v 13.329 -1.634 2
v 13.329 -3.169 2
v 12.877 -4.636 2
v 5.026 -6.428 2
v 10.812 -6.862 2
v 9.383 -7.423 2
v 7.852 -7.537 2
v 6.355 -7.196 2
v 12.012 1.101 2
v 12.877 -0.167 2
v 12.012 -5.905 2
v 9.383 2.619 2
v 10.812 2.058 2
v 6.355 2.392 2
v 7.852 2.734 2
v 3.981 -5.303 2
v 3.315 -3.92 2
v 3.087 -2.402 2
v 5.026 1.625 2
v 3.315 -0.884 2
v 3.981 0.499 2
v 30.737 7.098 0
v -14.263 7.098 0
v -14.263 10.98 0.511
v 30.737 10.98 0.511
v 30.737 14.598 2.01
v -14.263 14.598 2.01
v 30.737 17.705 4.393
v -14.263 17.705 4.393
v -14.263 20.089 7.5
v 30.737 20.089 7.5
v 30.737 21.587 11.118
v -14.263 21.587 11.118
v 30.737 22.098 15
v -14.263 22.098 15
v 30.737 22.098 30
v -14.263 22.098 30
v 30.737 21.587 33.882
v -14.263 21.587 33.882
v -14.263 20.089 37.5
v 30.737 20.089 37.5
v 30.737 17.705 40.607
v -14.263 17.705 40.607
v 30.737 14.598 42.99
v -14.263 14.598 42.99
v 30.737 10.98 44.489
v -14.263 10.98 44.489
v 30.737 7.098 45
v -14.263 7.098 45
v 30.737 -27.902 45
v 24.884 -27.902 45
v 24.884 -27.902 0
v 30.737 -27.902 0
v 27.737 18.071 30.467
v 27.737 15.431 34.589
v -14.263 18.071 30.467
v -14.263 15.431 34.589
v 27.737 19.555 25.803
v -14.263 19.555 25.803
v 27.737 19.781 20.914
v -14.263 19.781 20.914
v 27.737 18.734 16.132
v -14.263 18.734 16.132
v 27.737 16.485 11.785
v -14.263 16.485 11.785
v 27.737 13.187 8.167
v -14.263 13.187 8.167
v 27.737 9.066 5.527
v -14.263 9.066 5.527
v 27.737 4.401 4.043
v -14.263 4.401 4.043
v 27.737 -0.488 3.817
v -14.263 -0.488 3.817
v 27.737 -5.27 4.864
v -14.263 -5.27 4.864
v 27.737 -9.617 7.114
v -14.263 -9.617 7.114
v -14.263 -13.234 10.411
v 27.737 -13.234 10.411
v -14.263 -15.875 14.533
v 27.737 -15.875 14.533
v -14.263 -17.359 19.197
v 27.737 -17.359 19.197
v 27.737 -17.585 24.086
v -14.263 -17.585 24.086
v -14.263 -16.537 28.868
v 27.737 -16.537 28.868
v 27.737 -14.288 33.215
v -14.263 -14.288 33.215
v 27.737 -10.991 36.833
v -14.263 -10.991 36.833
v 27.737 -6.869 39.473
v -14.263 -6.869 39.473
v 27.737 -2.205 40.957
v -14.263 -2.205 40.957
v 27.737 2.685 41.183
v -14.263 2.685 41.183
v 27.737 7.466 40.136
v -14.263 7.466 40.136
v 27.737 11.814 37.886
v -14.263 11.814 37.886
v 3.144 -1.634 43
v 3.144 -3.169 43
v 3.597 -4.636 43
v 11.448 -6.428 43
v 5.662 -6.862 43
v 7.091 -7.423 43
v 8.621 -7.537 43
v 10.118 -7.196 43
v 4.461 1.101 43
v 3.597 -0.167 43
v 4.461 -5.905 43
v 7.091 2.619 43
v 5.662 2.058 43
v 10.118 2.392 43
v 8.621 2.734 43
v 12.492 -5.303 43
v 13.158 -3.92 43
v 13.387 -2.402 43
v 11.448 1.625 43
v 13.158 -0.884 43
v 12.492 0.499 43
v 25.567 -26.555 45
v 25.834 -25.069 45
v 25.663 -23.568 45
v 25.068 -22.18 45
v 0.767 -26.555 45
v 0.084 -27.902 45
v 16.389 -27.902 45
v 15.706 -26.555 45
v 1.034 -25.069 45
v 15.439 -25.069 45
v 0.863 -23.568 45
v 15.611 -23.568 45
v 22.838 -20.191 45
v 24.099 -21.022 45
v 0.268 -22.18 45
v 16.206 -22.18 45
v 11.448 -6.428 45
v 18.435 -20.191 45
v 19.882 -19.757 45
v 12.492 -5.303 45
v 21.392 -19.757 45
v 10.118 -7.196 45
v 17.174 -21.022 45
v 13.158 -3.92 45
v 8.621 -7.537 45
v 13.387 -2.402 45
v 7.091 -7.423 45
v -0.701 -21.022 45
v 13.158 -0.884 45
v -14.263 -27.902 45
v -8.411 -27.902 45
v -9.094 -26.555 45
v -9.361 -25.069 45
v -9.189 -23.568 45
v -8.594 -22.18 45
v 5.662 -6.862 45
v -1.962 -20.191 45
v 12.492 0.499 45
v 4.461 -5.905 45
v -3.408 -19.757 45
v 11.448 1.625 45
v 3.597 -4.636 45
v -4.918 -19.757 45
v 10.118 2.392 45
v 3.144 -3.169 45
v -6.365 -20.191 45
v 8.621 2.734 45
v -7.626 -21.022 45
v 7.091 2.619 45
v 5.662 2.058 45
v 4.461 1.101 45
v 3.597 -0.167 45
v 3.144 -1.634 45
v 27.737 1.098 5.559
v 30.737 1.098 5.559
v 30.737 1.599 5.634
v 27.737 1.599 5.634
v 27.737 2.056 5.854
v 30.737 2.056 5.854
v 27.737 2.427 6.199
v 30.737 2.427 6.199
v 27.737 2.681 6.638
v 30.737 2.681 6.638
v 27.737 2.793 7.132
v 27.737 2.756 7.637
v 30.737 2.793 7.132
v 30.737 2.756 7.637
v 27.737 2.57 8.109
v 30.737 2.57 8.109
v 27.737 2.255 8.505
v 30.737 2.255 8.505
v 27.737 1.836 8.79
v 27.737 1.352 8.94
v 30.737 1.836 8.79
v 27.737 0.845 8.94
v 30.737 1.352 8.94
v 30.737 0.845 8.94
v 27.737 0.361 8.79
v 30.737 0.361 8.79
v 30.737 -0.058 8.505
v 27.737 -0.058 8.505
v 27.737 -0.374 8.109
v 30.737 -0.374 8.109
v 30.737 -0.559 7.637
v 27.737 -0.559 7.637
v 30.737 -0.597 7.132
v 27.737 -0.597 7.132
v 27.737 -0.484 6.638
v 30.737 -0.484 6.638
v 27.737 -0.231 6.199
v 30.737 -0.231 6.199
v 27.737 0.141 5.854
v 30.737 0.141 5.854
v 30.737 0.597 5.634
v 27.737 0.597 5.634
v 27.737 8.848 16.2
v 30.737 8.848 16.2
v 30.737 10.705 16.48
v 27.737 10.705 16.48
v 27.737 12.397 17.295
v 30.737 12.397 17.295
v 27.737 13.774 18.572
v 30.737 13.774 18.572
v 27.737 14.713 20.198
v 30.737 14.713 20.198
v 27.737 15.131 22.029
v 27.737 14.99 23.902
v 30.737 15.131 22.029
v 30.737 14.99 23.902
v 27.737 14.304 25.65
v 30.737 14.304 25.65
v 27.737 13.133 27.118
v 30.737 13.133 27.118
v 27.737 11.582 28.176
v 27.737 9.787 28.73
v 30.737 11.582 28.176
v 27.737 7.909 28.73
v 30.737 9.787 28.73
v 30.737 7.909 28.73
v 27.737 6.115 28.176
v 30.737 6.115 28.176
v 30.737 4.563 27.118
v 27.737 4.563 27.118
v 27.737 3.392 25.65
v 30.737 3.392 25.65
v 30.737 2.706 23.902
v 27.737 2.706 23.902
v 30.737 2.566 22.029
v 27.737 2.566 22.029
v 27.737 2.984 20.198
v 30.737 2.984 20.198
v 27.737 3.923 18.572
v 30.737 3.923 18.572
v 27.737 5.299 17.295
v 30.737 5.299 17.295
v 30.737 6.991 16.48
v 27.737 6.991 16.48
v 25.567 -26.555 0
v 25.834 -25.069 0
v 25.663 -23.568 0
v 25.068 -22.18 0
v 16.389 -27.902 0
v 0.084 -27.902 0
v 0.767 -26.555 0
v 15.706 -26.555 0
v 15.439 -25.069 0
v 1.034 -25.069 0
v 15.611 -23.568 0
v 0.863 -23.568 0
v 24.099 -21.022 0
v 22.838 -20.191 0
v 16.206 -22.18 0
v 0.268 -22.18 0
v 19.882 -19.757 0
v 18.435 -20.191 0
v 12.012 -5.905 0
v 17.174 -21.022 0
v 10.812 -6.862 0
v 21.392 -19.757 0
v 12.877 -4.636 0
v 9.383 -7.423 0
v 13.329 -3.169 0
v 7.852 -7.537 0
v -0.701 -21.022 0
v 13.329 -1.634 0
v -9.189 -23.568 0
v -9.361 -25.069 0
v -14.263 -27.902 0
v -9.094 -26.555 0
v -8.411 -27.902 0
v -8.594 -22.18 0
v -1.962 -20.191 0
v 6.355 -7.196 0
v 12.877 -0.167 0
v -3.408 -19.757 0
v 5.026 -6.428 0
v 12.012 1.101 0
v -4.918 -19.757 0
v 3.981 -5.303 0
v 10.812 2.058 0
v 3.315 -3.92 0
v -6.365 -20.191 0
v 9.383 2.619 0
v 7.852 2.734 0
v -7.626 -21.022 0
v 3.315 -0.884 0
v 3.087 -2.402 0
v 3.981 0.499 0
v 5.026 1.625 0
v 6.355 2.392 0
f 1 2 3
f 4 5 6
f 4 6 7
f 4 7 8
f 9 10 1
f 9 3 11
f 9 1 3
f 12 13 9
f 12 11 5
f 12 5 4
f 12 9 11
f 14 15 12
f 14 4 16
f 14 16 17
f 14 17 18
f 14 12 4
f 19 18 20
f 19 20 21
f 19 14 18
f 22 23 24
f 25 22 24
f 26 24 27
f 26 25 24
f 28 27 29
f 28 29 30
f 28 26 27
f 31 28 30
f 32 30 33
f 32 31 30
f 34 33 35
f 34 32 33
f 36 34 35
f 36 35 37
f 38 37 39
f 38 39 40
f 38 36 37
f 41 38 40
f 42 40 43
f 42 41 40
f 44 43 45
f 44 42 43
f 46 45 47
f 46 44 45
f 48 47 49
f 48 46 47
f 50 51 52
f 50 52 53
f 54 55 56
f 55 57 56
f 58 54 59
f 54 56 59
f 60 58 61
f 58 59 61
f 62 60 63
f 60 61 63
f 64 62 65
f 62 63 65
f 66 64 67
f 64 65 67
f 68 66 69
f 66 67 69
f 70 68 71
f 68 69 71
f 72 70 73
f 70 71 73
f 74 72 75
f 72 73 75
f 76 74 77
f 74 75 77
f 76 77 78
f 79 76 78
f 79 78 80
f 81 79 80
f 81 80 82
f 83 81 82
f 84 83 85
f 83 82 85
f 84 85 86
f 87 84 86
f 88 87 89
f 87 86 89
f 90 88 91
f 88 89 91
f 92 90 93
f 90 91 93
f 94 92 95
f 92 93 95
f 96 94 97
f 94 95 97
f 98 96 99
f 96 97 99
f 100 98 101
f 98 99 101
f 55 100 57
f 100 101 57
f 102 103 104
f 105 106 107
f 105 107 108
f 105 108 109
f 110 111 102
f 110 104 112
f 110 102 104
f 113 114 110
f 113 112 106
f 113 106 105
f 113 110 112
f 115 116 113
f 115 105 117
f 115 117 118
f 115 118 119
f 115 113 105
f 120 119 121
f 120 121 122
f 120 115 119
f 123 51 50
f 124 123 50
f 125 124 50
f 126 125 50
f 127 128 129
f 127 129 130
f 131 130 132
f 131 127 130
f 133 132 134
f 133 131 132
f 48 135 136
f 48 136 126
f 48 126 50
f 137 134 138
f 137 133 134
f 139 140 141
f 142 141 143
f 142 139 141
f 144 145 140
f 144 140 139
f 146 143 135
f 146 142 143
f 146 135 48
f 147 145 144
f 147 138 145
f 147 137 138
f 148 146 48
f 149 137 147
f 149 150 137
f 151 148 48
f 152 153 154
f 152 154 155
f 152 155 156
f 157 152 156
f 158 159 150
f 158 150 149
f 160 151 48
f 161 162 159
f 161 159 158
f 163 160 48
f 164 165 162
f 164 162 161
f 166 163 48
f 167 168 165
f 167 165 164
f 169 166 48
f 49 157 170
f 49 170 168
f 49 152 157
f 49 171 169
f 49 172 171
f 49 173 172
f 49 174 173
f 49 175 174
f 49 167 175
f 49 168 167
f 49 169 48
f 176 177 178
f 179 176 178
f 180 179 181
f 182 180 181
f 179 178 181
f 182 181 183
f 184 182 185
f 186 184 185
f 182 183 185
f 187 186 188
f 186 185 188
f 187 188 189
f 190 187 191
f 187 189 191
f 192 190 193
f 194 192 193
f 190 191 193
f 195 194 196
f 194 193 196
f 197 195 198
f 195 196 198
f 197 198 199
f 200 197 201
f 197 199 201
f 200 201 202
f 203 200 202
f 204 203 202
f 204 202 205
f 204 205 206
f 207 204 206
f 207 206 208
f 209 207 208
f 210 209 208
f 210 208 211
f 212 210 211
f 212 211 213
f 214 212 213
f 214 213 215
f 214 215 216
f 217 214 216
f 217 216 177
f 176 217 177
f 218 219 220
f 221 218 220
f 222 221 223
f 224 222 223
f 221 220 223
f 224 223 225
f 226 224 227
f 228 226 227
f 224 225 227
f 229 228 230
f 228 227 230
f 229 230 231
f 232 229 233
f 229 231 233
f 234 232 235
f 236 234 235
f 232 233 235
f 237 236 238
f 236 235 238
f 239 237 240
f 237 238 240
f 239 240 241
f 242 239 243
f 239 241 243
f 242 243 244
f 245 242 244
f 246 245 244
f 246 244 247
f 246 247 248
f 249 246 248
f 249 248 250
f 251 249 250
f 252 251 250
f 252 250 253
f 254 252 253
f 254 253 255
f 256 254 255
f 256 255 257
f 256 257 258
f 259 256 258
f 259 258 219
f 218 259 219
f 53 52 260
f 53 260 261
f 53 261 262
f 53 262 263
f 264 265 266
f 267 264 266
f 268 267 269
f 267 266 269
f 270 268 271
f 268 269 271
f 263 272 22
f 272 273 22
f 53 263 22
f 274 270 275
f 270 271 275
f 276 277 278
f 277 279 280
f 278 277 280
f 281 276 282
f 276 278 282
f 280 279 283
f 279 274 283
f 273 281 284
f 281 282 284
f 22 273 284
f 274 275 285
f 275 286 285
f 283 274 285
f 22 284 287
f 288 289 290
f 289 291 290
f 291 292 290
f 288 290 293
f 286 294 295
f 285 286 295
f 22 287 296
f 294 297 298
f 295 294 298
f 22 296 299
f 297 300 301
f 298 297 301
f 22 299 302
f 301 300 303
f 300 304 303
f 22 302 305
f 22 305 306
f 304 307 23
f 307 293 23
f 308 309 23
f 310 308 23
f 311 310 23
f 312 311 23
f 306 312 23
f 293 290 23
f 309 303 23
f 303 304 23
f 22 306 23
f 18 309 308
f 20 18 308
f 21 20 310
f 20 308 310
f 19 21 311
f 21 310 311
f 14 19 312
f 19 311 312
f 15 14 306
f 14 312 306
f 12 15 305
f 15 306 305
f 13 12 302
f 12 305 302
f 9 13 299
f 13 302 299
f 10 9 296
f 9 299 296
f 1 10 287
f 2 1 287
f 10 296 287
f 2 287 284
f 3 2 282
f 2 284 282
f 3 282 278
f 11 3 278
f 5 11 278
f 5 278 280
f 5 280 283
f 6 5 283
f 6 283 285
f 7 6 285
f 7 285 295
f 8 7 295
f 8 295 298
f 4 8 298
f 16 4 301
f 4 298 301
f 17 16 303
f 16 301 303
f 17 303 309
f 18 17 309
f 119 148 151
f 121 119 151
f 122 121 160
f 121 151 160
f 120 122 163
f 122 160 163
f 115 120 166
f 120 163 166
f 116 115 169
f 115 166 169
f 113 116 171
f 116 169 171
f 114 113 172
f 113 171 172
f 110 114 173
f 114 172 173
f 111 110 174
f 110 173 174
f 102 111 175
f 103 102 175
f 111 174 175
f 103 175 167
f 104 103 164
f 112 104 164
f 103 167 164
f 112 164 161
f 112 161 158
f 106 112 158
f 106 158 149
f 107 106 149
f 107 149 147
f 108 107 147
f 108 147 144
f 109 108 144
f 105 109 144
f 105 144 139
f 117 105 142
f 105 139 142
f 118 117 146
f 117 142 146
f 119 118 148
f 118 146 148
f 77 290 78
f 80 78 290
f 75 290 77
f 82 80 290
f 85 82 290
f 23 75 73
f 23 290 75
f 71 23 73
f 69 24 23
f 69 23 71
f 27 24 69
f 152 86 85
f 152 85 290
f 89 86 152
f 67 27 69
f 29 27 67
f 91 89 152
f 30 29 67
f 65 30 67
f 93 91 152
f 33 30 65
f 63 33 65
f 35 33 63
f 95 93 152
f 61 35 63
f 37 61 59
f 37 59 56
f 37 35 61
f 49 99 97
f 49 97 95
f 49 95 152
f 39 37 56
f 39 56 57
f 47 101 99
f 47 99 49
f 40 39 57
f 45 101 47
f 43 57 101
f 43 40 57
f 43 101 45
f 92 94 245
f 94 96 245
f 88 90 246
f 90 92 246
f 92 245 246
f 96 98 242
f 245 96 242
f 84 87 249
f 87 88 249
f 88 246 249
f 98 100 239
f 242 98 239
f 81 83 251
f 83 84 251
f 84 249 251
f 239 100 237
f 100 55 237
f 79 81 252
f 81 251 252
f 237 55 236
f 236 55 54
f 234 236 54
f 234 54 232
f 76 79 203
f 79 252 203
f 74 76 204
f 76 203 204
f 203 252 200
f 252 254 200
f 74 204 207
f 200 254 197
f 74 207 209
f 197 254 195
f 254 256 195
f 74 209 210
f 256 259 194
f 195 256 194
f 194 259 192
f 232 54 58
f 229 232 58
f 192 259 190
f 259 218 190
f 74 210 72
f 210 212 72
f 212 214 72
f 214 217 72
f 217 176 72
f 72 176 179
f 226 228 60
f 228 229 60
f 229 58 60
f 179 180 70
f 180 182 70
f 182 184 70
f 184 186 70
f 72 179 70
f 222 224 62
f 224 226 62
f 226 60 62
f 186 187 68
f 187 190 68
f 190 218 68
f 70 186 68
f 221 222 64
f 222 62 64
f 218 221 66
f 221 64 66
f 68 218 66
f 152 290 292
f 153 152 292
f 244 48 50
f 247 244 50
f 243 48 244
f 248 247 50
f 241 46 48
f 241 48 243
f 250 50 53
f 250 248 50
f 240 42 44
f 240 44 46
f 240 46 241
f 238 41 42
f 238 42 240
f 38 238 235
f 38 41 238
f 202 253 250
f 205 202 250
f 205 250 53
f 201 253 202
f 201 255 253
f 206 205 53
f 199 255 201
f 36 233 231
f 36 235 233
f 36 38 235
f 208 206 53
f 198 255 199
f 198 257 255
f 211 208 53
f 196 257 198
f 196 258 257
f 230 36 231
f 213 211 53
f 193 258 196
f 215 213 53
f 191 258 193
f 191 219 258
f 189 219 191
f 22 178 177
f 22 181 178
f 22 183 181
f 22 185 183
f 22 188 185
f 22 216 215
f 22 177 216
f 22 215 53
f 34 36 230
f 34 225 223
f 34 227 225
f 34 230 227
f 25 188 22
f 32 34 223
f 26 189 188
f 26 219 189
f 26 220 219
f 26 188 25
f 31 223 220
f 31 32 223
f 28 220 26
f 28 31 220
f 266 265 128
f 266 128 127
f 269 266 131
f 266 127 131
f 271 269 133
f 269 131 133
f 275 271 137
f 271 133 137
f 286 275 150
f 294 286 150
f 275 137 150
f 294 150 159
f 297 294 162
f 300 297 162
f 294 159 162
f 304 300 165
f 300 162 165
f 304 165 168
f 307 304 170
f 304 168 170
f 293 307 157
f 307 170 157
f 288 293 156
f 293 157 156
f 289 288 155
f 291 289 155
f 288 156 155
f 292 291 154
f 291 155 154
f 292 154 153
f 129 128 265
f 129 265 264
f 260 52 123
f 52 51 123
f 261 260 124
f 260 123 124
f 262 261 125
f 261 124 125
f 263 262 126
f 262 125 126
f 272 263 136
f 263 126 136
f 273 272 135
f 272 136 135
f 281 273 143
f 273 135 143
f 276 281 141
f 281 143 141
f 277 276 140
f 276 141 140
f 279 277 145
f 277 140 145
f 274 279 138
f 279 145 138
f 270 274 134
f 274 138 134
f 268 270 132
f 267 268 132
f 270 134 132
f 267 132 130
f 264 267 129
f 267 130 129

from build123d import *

# Parameters (mm, degrees)
SKETCH1_W           = 45
SKETCH1_H           = 50
BOSS_EXTRUDE1_DEPTH = 45
SKETCH2_R           = 5.2
CUT_EXTRUDE1_DEPTH  = 45
SKETCH9_R           = 5.15
CUT_EXTRUDE6_DEPTH  = 2
SKETCH10_R          = 5.15
CUT_EXTRUDE7_DEPTH  = 2
SKETCH12_R          = 18.75
CUT_EXTRUDE8_DEPTH  = 50
SKETCH13_W          = 45
SKETCH13_H          = 6.66747138
CUT_EXTRUDE9_DEPTH  = 46
SKETCH14_W          = 45
SKETCH14_H          = 6.66747138
BOSS_EXTRUDE2_DEPTH = 45
SKETCH15_R          = 18.375
CUT_EXTRUDE10_DEPTH = 45
FILLET1_R           = 15
SKETCH16_R          = 18.75
BOSS_EXTRUDE3_DEPTH = 2
SKETCH18_R          = 18.75
CUT_EXTRUDE11_DEPTH = 43
SKETCH19_R          = 6.3
CUT_EXTRUDE12_DEPTH = 43
SKETCH20_R          = 1.7
CUT_EXTRUDE13_DEPTH = 43
SKETCH21_R          = 20
SKETCH21_R_2        = 18.75
BOSS_EXTRUDE4_DEPTH = 7
SKETCH22_R          = 18.75
SKETCH22_R_2        = 1.7
SKETCH22_R_3        = 6.3
BOSS_EXTRUDE5_DEPTH = 7
SKETCH23_R          = 18.75
SKETCH23_R_2        = 1.7
SKETCH23_R_3        = 6.3
CUT_EXTRUDE14_DEPTH = 7
SKETCH24_R          = 1.7
CUT_EXTRUDE15_DEPTH = 5
BOSS_EXTRUDE6_DEPTH = 2
SKETCH26_R          = 20
SKETCH26_R_2        = 6.3
SKETCH26_R_3        = 1.7
BOSS_EXTRUDE7_DEPTH = 10
SKETCH27_R          = 20
CUT_EXTRUDE16_DEPTH = 7


with BuildPart() as part:
    # Sketch1 → Boss-Extrude1 (new body)
    with BuildSketch(Plane.XY):
        with Locations((8.236607143, -2.901785714)):
            Rectangle(SKETCH1_W, SKETCH1_H)
    extrude(amount=BOSS_EXTRUDE1_DEPTH)

    # Sketch2 → Cut-Extrude1 (cut)
    with BuildSketch(Plane.XY.offset(45)):
        with Locations((-4.163392857, -24.901785714)):
            Circle(SKETCH2_R)
        with Locations((20.636607143, -24.901785714)):
            Circle(SKETCH2_R)
    extrude(amount=-CUT_EXTRUDE1_DEPTH, mode=Mode.SUBTRACT)

    # Sketch9 → Cut-Extrude6 (cut)
    with BuildSketch(Plane.XY.offset(45)):
        with Locations((8.236607143, -2.401785714)):
            Circle(SKETCH9_R)
    extrude(amount=-CUT_EXTRUDE6_DEPTH, mode=Mode.SUBTRACT)

    # Sketch10 → Cut-Extrude7 (cut)
    with BuildSketch(Plane(origin=(0, 0, 0), x_dir=(-1, 0, 0), z_dir=(0, 0, -1))):
        with Locations((-8.236607143, -2.401785714)):
            Circle(SKETCH10_R)
    extrude(amount=-CUT_EXTRUDE7_DEPTH, mode=Mode.SUBTRACT)

    # Sketch12 → Cut-Extrude8 (cut)
    with BuildSketch(Plane.ZY.offset(14.263392857)):
        with Locations((22.5, 1.098214286)):
            Circle(SKETCH12_R)
    extrude(amount=-CUT_EXTRUDE8_DEPTH, mode=Mode.SUBTRACT)

    # Sketch13 → Cut-Extrude9 (cut)
    with BuildSketch(Plane.ZY.offset(14.263392857)):
        with Locations((22.5, 18.764478596)):
            Rectangle(SKETCH13_W, SKETCH13_H)
    extrude(amount=-CUT_EXTRUDE9_DEPTH, mode=Mode.SUBTRACT)

    # Sketch14 → Boss-Extrude2 (add)
    with BuildSketch(Plane.ZY.offset(14.263392857)):
        with Locations((22.5, 18.764478596)):
            Rectangle(SKETCH14_W, SKETCH14_H)
    extrude(amount=-BOSS_EXTRUDE2_DEPTH)

    # Sketch15 → Cut-Extrude10 (cut)
    with BuildSketch(Plane.ZY.offset(14.263392857)):
        with Locations((22.5, 1.098214286)):
            Circle(SKETCH15_R)
    extrude(amount=-CUT_EXTRUDE10_DEPTH, mode=Mode.SUBTRACT)

    # Fillet1
    fillet1_edges = [part.edges().sort_by_distance(p)[0] for p in [
        (8.236607143, 22.098214286, 0),
        (8.236607143, 22.098214286, 45),
    ]]
    fillet(fillet1_edges, radius=FILLET1_R)

    # Sketch16 → Boss-Extrude3 (add)
    with BuildSketch(Plane(origin=(30.736607143, 0, 0), x_dir=(0, 0, -1), z_dir=(1, 0, 0))):
        with Locations((-22.5, 1.098214286)):
            Circle(SKETCH16_R)
    extrude(amount=-BOSS_EXTRUDE3_DEPTH)

    # Sketch18 → Cut-Extrude11 (cut)
    with BuildSketch(Plane.ZY.offset(14.263392857)):
        with Locations((22.5, 1.098214286)):
            Circle(SKETCH18_R)
    extrude(amount=-CUT_EXTRUDE11_DEPTH, mode=Mode.SUBTRACT)

    # Sketch19 → Cut-Extrude12 (cut)
    with BuildSketch(Plane(origin=(30.736607143, 0, 0), x_dir=(0, 0, -1), z_dir=(1, 0, 0))):
        with Locations((-22.5, 8.848214286)):
            Circle(SKETCH19_R)
    extrude(amount=-CUT_EXTRUDE12_DEPTH, mode=Mode.SUBTRACT)

    # Sketch20 → Cut-Extrude13 (cut)
    with BuildSketch(Plane(origin=(30.736607143, 0, 0), x_dir=(0, 0, -1), z_dir=(1, 0, 0))):
        with Locations((-6.05, 1.098214286)):
            Circle(SKETCH20_R)
    extrude(amount=-CUT_EXTRUDE13_DEPTH, mode=Mode.SUBTRACT)

    # Sketch21 → Boss-Extrude4 (add)
    with BuildSketch(Plane(origin=(30.736607143, 0, 0), x_dir=(0, 0, -1), z_dir=(1, 0, 0))):
        with Locations((-22.5, 1.098214286)):
            Circle(SKETCH21_R)
        with Locations((-22.5, 1.098214286)):
            Circle(SKETCH21_R_2, mode=Mode.SUBTRACT)
    extrude(amount=BOSS_EXTRUDE4_DEPTH)

    # Sketch22 → Boss-Extrude5 (add)
    with BuildSketch(Plane(origin=(30.736607143, 0, 0), x_dir=(0, 0, -1), z_dir=(1, 0, 0))):
        with Locations((-22.5, 1.098214286)):
            Circle(SKETCH22_R)
        with Locations((-6.05, 1.098214286)):
            Circle(SKETCH22_R_2, mode=Mode.SUBTRACT)
        with Locations((-22.5, 8.848214286)):
            Circle(SKETCH22_R_3, mode=Mode.SUBTRACT)
    extrude(amount=BOSS_EXTRUDE5_DEPTH)

    # Sketch23 → Cut-Extrude14 (cut)
    with BuildSketch(Plane.ZY.offset(-28.736607143)):
        with Locations((22.5, 1.098214286)):
            Circle(SKETCH23_R)
        with Locations((6.05, 1.098214286)):
            Circle(SKETCH23_R_2, mode=Mode.SUBTRACT)
        with Locations((22.5, 8.848214286)):
            Circle(SKETCH23_R_3, mode=Mode.SUBTRACT)
    extrude(amount=-CUT_EXTRUDE14_DEPTH, mode=Mode.SUBTRACT)

    # Sketch24 → Cut-Extrude15 (cut)
    with BuildSketch(Plane(origin=(37.736607143, 0, 0), x_dir=(0, 0, -1), z_dir=(1, 0, 0))):
        with Locations((-7.25882025, 1.098214286)):
            Circle(SKETCH24_R)
    extrude(amount=-CUT_EXTRUDE15_DEPTH, mode=Mode.SUBTRACT)

    # Sketch25 → Boss-Extrude6 (add)
    with BuildSketch(Plane(origin=(37.736607143, 0, 0), x_dir=(0, 0, -1), z_dir=(1, 0, 0))):
        with BuildLine():
            ThreePointArc((-6.654410125, 2.687141094), (-5.859267248, 2.063227961), (-5.55882025, 1.098214286))
            ThreePointArc((-5.55882025, 1.098214286), (-5.859267248, 0.13320061), (-6.654410125, -0.490712522))
            ThreePointArc((-6.654410125, -0.490712522), (-4.35, 1.098214286), (-6.654410125, 2.687141094))
        make_face()
    extrude(amount=-BOSS_EXTRUDE6_DEPTH)

    # Sketch26 → Boss-Extrude7 (add)
    with BuildSketch(Plane(origin=(37.736607143, 0, 0), x_dir=(0, 0, -1), z_dir=(1, 0, 0))):
        with Locations((-22.5, 1.098214286)):
            Circle(SKETCH26_R)
        with Locations((-22.5, 8.848214286)):
            Circle(SKETCH26_R_2, mode=Mode.SUBTRACT)
        with Locations((-7.25882025, 1.098214286)):
            Circle(SKETCH26_R_3, mode=Mode.SUBTRACT)
    extrude(amount=-BOSS_EXTRUDE7_DEPTH)

    # Sketch27 → Cut-Extrude16 (cut)
    with BuildSketch(Plane(origin=(37.736607143, 0, 0), x_dir=(0, 0, -1), z_dir=(1, 0, 0))):
        with Locations((-22.5, 1.098214286)):
            Circle(SKETCH27_R)
    extrude(amount=-CUT_EXTRUDE16_DEPTH, mode=Mode.SUBTRACT)


solid = part.part
